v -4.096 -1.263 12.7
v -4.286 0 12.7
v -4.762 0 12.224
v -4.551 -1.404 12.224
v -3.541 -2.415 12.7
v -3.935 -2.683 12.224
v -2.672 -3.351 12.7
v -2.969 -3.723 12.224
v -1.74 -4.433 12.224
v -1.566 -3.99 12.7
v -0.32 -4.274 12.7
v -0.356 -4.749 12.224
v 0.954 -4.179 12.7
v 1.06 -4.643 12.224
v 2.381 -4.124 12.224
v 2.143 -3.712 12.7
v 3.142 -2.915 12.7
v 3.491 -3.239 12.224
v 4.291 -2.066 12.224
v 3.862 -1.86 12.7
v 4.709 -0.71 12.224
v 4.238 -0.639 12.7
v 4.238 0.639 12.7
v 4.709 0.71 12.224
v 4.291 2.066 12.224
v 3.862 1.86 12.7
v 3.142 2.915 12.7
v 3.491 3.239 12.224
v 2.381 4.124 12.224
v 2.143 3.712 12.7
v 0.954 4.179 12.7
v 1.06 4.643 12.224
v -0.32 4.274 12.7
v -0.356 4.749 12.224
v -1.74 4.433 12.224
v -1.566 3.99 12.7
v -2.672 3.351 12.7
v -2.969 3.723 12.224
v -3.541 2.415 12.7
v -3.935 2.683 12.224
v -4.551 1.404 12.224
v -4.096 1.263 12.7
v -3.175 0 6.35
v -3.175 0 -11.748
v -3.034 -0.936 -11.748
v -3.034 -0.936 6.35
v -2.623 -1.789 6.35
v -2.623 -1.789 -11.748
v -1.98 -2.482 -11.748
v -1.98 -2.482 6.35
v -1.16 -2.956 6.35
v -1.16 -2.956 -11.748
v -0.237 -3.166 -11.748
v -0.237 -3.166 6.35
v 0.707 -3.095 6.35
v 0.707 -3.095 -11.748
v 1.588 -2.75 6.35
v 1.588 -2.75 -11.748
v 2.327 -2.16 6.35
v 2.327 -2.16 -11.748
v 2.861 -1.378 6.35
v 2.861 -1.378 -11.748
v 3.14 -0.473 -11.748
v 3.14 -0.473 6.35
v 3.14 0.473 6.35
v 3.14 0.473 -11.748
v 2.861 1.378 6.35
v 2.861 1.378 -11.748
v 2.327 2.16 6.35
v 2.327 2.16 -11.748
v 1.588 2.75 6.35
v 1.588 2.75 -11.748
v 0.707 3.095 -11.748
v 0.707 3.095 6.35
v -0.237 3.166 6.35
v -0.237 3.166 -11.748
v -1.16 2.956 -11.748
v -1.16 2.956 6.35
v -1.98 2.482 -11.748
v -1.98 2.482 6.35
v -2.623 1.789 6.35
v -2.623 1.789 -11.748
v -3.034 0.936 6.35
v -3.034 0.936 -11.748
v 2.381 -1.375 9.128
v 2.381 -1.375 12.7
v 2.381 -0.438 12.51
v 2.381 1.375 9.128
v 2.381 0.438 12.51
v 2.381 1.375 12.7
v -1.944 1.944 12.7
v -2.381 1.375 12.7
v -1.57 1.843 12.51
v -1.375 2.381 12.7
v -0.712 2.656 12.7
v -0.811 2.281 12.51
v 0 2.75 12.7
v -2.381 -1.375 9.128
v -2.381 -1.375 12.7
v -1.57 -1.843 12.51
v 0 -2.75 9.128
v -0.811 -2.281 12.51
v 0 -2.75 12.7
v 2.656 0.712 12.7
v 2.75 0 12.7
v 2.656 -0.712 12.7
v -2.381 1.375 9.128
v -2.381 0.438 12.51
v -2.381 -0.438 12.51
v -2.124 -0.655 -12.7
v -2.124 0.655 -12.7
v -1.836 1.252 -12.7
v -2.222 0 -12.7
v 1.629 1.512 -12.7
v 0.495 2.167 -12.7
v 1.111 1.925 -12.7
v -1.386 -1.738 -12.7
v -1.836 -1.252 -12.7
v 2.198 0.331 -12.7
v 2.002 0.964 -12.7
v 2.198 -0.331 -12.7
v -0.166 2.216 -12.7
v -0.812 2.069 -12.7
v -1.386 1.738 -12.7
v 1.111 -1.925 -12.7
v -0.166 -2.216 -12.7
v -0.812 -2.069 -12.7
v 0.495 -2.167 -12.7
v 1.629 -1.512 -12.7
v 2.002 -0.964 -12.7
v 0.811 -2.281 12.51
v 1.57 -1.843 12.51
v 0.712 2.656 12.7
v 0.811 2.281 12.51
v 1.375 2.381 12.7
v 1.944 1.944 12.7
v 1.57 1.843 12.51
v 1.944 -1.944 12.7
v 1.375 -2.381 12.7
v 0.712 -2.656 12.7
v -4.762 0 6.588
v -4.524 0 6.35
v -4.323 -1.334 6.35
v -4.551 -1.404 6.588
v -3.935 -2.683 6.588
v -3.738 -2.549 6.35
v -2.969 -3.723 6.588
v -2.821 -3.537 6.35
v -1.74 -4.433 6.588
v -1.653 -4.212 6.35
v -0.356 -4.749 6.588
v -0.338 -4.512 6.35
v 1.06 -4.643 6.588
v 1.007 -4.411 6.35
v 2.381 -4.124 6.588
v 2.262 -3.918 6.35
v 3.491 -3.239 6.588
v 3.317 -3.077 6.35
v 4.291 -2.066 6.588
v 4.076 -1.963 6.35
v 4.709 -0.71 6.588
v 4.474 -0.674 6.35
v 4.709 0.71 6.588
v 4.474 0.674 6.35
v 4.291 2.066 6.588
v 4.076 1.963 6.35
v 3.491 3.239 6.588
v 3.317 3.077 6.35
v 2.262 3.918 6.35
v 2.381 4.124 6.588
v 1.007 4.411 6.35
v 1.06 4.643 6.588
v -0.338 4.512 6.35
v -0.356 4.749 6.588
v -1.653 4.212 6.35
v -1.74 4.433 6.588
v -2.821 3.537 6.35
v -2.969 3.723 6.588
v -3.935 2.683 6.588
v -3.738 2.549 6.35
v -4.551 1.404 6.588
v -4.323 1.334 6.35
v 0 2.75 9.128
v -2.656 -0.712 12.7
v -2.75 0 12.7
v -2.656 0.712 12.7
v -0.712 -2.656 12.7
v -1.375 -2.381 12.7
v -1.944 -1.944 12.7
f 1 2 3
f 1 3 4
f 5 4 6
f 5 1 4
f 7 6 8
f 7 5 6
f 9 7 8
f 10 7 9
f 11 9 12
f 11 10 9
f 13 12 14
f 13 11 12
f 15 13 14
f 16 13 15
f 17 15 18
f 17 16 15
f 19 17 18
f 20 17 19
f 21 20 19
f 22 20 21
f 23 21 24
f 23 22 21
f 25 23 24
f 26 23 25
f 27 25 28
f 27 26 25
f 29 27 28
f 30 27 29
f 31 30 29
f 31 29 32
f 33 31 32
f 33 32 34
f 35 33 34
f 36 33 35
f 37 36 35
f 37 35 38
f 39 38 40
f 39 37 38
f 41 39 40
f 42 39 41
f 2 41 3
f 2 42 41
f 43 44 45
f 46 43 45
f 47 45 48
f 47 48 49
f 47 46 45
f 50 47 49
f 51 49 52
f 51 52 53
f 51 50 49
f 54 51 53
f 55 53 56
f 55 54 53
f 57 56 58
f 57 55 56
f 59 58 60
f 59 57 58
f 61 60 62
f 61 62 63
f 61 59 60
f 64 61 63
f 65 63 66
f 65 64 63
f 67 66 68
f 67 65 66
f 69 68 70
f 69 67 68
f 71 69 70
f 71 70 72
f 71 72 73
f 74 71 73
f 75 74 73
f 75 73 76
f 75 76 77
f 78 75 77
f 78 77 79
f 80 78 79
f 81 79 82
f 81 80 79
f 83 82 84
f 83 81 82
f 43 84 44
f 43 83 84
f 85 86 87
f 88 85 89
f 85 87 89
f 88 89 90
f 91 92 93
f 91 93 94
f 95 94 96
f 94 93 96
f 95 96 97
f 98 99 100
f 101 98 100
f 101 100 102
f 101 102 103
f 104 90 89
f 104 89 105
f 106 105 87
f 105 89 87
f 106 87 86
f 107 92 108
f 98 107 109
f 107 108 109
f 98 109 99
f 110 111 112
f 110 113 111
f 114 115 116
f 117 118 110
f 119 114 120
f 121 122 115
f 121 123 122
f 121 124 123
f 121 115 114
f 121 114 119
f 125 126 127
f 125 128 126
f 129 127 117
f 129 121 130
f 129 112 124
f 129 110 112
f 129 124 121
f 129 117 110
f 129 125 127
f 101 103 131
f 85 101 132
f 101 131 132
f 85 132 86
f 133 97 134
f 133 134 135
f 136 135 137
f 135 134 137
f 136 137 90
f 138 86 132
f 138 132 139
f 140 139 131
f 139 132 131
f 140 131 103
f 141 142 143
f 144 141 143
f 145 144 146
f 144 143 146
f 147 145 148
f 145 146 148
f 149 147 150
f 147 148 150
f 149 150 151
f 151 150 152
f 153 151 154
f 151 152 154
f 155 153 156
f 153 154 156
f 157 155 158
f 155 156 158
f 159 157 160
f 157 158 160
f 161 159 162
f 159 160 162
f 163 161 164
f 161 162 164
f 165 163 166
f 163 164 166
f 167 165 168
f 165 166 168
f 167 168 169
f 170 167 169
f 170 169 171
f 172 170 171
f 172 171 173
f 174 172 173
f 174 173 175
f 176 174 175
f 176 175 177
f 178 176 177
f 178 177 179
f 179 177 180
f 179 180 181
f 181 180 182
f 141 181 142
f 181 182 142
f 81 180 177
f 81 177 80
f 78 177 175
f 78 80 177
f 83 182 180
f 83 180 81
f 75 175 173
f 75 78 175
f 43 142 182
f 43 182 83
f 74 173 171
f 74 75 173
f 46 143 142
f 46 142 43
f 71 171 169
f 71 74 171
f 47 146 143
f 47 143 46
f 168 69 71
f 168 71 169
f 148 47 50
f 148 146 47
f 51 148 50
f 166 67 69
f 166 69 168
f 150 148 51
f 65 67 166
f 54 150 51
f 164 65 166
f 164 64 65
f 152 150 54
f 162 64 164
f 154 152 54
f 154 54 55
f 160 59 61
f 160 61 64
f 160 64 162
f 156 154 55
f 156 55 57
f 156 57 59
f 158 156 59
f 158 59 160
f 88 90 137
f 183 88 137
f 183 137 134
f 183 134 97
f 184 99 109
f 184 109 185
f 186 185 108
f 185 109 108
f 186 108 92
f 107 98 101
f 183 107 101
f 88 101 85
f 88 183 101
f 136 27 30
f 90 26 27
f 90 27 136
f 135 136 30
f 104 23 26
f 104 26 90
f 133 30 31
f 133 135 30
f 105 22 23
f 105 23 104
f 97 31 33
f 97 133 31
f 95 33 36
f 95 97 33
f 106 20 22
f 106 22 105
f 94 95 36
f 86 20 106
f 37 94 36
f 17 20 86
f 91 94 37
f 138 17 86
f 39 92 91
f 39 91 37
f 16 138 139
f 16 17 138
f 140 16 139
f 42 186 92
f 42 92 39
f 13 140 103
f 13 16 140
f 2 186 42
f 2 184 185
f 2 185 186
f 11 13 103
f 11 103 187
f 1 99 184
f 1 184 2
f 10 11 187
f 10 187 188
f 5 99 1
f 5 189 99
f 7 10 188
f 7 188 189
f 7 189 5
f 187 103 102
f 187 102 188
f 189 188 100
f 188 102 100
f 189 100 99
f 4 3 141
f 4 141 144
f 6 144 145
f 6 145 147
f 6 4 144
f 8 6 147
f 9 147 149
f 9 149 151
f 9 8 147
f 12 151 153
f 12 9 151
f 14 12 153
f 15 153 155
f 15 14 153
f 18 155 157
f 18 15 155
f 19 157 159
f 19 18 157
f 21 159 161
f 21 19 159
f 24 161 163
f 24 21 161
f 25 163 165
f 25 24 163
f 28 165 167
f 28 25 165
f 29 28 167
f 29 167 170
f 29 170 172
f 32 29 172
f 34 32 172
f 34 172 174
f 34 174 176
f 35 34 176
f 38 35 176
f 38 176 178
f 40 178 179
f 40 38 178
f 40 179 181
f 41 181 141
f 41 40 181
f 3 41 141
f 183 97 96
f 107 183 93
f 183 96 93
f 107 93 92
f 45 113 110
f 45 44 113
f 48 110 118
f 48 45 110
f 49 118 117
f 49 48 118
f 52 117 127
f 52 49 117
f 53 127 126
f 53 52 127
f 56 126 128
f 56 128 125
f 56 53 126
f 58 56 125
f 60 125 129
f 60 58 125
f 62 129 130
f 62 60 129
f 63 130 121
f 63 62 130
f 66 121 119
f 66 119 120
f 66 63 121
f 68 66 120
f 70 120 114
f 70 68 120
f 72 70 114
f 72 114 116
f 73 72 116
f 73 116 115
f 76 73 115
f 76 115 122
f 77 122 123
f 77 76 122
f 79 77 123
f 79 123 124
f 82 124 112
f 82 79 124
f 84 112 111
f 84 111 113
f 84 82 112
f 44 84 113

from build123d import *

# Parameters (mm, degrees)
CUT_EXTRUDE1_DEPTH = 3.571875
CHAMFER1_SIZE      = 0.47625
CHAMFER2_SIZE      = 0.238125


with BuildPart() as part:
    # Sketch2 → Revolve1 (revolve)
    with BuildSketch(Plane(origin=(0, 0, 0), x_dir=(0, 0, -1), z_dir=(1, 0, 0))):
        Polygon((12.7, 2.2225), (11.7475, 3.175), (-6.35, 3.175), (-6.35, 4.7625), (-12.7, 4.7625), (-12.7, 0), (12.7, 0), align=None)
    revolve(axis=Axis((0, 0, -12.7), (0, 0, 1)))

    # Sketch4 → Cut-Extrude1 (cut)
    with BuildSketch(Plane.XY.offset(12.7)):
        Polygon((0, 2.749630657), (-2.38125, 1.374815329), (-2.38125, -1.374815329), (0, -2.749630657), (2.38125, -1.374815329), (2.38125, 1.374815329), align=None)
    extrude(amount=-CUT_EXTRUDE1_DEPTH, mode=Mode.SUBTRACT)

    # Cut-Extrude2 cone 1 section (through the dimple's axis) → Cut-Extrude2 (revolve, cut)
    with BuildSketch(Plane(origin=(0, 0, 12.7), x_dir=(0, -1, 0), z_dir=(1, 0, 0))):
        Polygon((0, 0), (2.749630657, 0), (0, 1.5875), align=None)
    revolve(axis=Axis((0, 0, 12.7), (0, 0, -1)), mode=Mode.SUBTRACT)

    # Chamfer1
    chamfer1_edges = [part.edges().sort_by_distance(p)[0] for p in [
        (0, -4.7625, 12.7),
    ]]
    chamfer(chamfer1_edges, length=CHAMFER1_SIZE)

    # Chamfer2
    chamfer2_edges = [part.edges().sort_by_distance(p)[0] for p in [
        (0, -4.7625, 6.35),
    ]]
    chamfer(chamfer2_edges, length=CHAMFER2_SIZE)


solid = part.part
